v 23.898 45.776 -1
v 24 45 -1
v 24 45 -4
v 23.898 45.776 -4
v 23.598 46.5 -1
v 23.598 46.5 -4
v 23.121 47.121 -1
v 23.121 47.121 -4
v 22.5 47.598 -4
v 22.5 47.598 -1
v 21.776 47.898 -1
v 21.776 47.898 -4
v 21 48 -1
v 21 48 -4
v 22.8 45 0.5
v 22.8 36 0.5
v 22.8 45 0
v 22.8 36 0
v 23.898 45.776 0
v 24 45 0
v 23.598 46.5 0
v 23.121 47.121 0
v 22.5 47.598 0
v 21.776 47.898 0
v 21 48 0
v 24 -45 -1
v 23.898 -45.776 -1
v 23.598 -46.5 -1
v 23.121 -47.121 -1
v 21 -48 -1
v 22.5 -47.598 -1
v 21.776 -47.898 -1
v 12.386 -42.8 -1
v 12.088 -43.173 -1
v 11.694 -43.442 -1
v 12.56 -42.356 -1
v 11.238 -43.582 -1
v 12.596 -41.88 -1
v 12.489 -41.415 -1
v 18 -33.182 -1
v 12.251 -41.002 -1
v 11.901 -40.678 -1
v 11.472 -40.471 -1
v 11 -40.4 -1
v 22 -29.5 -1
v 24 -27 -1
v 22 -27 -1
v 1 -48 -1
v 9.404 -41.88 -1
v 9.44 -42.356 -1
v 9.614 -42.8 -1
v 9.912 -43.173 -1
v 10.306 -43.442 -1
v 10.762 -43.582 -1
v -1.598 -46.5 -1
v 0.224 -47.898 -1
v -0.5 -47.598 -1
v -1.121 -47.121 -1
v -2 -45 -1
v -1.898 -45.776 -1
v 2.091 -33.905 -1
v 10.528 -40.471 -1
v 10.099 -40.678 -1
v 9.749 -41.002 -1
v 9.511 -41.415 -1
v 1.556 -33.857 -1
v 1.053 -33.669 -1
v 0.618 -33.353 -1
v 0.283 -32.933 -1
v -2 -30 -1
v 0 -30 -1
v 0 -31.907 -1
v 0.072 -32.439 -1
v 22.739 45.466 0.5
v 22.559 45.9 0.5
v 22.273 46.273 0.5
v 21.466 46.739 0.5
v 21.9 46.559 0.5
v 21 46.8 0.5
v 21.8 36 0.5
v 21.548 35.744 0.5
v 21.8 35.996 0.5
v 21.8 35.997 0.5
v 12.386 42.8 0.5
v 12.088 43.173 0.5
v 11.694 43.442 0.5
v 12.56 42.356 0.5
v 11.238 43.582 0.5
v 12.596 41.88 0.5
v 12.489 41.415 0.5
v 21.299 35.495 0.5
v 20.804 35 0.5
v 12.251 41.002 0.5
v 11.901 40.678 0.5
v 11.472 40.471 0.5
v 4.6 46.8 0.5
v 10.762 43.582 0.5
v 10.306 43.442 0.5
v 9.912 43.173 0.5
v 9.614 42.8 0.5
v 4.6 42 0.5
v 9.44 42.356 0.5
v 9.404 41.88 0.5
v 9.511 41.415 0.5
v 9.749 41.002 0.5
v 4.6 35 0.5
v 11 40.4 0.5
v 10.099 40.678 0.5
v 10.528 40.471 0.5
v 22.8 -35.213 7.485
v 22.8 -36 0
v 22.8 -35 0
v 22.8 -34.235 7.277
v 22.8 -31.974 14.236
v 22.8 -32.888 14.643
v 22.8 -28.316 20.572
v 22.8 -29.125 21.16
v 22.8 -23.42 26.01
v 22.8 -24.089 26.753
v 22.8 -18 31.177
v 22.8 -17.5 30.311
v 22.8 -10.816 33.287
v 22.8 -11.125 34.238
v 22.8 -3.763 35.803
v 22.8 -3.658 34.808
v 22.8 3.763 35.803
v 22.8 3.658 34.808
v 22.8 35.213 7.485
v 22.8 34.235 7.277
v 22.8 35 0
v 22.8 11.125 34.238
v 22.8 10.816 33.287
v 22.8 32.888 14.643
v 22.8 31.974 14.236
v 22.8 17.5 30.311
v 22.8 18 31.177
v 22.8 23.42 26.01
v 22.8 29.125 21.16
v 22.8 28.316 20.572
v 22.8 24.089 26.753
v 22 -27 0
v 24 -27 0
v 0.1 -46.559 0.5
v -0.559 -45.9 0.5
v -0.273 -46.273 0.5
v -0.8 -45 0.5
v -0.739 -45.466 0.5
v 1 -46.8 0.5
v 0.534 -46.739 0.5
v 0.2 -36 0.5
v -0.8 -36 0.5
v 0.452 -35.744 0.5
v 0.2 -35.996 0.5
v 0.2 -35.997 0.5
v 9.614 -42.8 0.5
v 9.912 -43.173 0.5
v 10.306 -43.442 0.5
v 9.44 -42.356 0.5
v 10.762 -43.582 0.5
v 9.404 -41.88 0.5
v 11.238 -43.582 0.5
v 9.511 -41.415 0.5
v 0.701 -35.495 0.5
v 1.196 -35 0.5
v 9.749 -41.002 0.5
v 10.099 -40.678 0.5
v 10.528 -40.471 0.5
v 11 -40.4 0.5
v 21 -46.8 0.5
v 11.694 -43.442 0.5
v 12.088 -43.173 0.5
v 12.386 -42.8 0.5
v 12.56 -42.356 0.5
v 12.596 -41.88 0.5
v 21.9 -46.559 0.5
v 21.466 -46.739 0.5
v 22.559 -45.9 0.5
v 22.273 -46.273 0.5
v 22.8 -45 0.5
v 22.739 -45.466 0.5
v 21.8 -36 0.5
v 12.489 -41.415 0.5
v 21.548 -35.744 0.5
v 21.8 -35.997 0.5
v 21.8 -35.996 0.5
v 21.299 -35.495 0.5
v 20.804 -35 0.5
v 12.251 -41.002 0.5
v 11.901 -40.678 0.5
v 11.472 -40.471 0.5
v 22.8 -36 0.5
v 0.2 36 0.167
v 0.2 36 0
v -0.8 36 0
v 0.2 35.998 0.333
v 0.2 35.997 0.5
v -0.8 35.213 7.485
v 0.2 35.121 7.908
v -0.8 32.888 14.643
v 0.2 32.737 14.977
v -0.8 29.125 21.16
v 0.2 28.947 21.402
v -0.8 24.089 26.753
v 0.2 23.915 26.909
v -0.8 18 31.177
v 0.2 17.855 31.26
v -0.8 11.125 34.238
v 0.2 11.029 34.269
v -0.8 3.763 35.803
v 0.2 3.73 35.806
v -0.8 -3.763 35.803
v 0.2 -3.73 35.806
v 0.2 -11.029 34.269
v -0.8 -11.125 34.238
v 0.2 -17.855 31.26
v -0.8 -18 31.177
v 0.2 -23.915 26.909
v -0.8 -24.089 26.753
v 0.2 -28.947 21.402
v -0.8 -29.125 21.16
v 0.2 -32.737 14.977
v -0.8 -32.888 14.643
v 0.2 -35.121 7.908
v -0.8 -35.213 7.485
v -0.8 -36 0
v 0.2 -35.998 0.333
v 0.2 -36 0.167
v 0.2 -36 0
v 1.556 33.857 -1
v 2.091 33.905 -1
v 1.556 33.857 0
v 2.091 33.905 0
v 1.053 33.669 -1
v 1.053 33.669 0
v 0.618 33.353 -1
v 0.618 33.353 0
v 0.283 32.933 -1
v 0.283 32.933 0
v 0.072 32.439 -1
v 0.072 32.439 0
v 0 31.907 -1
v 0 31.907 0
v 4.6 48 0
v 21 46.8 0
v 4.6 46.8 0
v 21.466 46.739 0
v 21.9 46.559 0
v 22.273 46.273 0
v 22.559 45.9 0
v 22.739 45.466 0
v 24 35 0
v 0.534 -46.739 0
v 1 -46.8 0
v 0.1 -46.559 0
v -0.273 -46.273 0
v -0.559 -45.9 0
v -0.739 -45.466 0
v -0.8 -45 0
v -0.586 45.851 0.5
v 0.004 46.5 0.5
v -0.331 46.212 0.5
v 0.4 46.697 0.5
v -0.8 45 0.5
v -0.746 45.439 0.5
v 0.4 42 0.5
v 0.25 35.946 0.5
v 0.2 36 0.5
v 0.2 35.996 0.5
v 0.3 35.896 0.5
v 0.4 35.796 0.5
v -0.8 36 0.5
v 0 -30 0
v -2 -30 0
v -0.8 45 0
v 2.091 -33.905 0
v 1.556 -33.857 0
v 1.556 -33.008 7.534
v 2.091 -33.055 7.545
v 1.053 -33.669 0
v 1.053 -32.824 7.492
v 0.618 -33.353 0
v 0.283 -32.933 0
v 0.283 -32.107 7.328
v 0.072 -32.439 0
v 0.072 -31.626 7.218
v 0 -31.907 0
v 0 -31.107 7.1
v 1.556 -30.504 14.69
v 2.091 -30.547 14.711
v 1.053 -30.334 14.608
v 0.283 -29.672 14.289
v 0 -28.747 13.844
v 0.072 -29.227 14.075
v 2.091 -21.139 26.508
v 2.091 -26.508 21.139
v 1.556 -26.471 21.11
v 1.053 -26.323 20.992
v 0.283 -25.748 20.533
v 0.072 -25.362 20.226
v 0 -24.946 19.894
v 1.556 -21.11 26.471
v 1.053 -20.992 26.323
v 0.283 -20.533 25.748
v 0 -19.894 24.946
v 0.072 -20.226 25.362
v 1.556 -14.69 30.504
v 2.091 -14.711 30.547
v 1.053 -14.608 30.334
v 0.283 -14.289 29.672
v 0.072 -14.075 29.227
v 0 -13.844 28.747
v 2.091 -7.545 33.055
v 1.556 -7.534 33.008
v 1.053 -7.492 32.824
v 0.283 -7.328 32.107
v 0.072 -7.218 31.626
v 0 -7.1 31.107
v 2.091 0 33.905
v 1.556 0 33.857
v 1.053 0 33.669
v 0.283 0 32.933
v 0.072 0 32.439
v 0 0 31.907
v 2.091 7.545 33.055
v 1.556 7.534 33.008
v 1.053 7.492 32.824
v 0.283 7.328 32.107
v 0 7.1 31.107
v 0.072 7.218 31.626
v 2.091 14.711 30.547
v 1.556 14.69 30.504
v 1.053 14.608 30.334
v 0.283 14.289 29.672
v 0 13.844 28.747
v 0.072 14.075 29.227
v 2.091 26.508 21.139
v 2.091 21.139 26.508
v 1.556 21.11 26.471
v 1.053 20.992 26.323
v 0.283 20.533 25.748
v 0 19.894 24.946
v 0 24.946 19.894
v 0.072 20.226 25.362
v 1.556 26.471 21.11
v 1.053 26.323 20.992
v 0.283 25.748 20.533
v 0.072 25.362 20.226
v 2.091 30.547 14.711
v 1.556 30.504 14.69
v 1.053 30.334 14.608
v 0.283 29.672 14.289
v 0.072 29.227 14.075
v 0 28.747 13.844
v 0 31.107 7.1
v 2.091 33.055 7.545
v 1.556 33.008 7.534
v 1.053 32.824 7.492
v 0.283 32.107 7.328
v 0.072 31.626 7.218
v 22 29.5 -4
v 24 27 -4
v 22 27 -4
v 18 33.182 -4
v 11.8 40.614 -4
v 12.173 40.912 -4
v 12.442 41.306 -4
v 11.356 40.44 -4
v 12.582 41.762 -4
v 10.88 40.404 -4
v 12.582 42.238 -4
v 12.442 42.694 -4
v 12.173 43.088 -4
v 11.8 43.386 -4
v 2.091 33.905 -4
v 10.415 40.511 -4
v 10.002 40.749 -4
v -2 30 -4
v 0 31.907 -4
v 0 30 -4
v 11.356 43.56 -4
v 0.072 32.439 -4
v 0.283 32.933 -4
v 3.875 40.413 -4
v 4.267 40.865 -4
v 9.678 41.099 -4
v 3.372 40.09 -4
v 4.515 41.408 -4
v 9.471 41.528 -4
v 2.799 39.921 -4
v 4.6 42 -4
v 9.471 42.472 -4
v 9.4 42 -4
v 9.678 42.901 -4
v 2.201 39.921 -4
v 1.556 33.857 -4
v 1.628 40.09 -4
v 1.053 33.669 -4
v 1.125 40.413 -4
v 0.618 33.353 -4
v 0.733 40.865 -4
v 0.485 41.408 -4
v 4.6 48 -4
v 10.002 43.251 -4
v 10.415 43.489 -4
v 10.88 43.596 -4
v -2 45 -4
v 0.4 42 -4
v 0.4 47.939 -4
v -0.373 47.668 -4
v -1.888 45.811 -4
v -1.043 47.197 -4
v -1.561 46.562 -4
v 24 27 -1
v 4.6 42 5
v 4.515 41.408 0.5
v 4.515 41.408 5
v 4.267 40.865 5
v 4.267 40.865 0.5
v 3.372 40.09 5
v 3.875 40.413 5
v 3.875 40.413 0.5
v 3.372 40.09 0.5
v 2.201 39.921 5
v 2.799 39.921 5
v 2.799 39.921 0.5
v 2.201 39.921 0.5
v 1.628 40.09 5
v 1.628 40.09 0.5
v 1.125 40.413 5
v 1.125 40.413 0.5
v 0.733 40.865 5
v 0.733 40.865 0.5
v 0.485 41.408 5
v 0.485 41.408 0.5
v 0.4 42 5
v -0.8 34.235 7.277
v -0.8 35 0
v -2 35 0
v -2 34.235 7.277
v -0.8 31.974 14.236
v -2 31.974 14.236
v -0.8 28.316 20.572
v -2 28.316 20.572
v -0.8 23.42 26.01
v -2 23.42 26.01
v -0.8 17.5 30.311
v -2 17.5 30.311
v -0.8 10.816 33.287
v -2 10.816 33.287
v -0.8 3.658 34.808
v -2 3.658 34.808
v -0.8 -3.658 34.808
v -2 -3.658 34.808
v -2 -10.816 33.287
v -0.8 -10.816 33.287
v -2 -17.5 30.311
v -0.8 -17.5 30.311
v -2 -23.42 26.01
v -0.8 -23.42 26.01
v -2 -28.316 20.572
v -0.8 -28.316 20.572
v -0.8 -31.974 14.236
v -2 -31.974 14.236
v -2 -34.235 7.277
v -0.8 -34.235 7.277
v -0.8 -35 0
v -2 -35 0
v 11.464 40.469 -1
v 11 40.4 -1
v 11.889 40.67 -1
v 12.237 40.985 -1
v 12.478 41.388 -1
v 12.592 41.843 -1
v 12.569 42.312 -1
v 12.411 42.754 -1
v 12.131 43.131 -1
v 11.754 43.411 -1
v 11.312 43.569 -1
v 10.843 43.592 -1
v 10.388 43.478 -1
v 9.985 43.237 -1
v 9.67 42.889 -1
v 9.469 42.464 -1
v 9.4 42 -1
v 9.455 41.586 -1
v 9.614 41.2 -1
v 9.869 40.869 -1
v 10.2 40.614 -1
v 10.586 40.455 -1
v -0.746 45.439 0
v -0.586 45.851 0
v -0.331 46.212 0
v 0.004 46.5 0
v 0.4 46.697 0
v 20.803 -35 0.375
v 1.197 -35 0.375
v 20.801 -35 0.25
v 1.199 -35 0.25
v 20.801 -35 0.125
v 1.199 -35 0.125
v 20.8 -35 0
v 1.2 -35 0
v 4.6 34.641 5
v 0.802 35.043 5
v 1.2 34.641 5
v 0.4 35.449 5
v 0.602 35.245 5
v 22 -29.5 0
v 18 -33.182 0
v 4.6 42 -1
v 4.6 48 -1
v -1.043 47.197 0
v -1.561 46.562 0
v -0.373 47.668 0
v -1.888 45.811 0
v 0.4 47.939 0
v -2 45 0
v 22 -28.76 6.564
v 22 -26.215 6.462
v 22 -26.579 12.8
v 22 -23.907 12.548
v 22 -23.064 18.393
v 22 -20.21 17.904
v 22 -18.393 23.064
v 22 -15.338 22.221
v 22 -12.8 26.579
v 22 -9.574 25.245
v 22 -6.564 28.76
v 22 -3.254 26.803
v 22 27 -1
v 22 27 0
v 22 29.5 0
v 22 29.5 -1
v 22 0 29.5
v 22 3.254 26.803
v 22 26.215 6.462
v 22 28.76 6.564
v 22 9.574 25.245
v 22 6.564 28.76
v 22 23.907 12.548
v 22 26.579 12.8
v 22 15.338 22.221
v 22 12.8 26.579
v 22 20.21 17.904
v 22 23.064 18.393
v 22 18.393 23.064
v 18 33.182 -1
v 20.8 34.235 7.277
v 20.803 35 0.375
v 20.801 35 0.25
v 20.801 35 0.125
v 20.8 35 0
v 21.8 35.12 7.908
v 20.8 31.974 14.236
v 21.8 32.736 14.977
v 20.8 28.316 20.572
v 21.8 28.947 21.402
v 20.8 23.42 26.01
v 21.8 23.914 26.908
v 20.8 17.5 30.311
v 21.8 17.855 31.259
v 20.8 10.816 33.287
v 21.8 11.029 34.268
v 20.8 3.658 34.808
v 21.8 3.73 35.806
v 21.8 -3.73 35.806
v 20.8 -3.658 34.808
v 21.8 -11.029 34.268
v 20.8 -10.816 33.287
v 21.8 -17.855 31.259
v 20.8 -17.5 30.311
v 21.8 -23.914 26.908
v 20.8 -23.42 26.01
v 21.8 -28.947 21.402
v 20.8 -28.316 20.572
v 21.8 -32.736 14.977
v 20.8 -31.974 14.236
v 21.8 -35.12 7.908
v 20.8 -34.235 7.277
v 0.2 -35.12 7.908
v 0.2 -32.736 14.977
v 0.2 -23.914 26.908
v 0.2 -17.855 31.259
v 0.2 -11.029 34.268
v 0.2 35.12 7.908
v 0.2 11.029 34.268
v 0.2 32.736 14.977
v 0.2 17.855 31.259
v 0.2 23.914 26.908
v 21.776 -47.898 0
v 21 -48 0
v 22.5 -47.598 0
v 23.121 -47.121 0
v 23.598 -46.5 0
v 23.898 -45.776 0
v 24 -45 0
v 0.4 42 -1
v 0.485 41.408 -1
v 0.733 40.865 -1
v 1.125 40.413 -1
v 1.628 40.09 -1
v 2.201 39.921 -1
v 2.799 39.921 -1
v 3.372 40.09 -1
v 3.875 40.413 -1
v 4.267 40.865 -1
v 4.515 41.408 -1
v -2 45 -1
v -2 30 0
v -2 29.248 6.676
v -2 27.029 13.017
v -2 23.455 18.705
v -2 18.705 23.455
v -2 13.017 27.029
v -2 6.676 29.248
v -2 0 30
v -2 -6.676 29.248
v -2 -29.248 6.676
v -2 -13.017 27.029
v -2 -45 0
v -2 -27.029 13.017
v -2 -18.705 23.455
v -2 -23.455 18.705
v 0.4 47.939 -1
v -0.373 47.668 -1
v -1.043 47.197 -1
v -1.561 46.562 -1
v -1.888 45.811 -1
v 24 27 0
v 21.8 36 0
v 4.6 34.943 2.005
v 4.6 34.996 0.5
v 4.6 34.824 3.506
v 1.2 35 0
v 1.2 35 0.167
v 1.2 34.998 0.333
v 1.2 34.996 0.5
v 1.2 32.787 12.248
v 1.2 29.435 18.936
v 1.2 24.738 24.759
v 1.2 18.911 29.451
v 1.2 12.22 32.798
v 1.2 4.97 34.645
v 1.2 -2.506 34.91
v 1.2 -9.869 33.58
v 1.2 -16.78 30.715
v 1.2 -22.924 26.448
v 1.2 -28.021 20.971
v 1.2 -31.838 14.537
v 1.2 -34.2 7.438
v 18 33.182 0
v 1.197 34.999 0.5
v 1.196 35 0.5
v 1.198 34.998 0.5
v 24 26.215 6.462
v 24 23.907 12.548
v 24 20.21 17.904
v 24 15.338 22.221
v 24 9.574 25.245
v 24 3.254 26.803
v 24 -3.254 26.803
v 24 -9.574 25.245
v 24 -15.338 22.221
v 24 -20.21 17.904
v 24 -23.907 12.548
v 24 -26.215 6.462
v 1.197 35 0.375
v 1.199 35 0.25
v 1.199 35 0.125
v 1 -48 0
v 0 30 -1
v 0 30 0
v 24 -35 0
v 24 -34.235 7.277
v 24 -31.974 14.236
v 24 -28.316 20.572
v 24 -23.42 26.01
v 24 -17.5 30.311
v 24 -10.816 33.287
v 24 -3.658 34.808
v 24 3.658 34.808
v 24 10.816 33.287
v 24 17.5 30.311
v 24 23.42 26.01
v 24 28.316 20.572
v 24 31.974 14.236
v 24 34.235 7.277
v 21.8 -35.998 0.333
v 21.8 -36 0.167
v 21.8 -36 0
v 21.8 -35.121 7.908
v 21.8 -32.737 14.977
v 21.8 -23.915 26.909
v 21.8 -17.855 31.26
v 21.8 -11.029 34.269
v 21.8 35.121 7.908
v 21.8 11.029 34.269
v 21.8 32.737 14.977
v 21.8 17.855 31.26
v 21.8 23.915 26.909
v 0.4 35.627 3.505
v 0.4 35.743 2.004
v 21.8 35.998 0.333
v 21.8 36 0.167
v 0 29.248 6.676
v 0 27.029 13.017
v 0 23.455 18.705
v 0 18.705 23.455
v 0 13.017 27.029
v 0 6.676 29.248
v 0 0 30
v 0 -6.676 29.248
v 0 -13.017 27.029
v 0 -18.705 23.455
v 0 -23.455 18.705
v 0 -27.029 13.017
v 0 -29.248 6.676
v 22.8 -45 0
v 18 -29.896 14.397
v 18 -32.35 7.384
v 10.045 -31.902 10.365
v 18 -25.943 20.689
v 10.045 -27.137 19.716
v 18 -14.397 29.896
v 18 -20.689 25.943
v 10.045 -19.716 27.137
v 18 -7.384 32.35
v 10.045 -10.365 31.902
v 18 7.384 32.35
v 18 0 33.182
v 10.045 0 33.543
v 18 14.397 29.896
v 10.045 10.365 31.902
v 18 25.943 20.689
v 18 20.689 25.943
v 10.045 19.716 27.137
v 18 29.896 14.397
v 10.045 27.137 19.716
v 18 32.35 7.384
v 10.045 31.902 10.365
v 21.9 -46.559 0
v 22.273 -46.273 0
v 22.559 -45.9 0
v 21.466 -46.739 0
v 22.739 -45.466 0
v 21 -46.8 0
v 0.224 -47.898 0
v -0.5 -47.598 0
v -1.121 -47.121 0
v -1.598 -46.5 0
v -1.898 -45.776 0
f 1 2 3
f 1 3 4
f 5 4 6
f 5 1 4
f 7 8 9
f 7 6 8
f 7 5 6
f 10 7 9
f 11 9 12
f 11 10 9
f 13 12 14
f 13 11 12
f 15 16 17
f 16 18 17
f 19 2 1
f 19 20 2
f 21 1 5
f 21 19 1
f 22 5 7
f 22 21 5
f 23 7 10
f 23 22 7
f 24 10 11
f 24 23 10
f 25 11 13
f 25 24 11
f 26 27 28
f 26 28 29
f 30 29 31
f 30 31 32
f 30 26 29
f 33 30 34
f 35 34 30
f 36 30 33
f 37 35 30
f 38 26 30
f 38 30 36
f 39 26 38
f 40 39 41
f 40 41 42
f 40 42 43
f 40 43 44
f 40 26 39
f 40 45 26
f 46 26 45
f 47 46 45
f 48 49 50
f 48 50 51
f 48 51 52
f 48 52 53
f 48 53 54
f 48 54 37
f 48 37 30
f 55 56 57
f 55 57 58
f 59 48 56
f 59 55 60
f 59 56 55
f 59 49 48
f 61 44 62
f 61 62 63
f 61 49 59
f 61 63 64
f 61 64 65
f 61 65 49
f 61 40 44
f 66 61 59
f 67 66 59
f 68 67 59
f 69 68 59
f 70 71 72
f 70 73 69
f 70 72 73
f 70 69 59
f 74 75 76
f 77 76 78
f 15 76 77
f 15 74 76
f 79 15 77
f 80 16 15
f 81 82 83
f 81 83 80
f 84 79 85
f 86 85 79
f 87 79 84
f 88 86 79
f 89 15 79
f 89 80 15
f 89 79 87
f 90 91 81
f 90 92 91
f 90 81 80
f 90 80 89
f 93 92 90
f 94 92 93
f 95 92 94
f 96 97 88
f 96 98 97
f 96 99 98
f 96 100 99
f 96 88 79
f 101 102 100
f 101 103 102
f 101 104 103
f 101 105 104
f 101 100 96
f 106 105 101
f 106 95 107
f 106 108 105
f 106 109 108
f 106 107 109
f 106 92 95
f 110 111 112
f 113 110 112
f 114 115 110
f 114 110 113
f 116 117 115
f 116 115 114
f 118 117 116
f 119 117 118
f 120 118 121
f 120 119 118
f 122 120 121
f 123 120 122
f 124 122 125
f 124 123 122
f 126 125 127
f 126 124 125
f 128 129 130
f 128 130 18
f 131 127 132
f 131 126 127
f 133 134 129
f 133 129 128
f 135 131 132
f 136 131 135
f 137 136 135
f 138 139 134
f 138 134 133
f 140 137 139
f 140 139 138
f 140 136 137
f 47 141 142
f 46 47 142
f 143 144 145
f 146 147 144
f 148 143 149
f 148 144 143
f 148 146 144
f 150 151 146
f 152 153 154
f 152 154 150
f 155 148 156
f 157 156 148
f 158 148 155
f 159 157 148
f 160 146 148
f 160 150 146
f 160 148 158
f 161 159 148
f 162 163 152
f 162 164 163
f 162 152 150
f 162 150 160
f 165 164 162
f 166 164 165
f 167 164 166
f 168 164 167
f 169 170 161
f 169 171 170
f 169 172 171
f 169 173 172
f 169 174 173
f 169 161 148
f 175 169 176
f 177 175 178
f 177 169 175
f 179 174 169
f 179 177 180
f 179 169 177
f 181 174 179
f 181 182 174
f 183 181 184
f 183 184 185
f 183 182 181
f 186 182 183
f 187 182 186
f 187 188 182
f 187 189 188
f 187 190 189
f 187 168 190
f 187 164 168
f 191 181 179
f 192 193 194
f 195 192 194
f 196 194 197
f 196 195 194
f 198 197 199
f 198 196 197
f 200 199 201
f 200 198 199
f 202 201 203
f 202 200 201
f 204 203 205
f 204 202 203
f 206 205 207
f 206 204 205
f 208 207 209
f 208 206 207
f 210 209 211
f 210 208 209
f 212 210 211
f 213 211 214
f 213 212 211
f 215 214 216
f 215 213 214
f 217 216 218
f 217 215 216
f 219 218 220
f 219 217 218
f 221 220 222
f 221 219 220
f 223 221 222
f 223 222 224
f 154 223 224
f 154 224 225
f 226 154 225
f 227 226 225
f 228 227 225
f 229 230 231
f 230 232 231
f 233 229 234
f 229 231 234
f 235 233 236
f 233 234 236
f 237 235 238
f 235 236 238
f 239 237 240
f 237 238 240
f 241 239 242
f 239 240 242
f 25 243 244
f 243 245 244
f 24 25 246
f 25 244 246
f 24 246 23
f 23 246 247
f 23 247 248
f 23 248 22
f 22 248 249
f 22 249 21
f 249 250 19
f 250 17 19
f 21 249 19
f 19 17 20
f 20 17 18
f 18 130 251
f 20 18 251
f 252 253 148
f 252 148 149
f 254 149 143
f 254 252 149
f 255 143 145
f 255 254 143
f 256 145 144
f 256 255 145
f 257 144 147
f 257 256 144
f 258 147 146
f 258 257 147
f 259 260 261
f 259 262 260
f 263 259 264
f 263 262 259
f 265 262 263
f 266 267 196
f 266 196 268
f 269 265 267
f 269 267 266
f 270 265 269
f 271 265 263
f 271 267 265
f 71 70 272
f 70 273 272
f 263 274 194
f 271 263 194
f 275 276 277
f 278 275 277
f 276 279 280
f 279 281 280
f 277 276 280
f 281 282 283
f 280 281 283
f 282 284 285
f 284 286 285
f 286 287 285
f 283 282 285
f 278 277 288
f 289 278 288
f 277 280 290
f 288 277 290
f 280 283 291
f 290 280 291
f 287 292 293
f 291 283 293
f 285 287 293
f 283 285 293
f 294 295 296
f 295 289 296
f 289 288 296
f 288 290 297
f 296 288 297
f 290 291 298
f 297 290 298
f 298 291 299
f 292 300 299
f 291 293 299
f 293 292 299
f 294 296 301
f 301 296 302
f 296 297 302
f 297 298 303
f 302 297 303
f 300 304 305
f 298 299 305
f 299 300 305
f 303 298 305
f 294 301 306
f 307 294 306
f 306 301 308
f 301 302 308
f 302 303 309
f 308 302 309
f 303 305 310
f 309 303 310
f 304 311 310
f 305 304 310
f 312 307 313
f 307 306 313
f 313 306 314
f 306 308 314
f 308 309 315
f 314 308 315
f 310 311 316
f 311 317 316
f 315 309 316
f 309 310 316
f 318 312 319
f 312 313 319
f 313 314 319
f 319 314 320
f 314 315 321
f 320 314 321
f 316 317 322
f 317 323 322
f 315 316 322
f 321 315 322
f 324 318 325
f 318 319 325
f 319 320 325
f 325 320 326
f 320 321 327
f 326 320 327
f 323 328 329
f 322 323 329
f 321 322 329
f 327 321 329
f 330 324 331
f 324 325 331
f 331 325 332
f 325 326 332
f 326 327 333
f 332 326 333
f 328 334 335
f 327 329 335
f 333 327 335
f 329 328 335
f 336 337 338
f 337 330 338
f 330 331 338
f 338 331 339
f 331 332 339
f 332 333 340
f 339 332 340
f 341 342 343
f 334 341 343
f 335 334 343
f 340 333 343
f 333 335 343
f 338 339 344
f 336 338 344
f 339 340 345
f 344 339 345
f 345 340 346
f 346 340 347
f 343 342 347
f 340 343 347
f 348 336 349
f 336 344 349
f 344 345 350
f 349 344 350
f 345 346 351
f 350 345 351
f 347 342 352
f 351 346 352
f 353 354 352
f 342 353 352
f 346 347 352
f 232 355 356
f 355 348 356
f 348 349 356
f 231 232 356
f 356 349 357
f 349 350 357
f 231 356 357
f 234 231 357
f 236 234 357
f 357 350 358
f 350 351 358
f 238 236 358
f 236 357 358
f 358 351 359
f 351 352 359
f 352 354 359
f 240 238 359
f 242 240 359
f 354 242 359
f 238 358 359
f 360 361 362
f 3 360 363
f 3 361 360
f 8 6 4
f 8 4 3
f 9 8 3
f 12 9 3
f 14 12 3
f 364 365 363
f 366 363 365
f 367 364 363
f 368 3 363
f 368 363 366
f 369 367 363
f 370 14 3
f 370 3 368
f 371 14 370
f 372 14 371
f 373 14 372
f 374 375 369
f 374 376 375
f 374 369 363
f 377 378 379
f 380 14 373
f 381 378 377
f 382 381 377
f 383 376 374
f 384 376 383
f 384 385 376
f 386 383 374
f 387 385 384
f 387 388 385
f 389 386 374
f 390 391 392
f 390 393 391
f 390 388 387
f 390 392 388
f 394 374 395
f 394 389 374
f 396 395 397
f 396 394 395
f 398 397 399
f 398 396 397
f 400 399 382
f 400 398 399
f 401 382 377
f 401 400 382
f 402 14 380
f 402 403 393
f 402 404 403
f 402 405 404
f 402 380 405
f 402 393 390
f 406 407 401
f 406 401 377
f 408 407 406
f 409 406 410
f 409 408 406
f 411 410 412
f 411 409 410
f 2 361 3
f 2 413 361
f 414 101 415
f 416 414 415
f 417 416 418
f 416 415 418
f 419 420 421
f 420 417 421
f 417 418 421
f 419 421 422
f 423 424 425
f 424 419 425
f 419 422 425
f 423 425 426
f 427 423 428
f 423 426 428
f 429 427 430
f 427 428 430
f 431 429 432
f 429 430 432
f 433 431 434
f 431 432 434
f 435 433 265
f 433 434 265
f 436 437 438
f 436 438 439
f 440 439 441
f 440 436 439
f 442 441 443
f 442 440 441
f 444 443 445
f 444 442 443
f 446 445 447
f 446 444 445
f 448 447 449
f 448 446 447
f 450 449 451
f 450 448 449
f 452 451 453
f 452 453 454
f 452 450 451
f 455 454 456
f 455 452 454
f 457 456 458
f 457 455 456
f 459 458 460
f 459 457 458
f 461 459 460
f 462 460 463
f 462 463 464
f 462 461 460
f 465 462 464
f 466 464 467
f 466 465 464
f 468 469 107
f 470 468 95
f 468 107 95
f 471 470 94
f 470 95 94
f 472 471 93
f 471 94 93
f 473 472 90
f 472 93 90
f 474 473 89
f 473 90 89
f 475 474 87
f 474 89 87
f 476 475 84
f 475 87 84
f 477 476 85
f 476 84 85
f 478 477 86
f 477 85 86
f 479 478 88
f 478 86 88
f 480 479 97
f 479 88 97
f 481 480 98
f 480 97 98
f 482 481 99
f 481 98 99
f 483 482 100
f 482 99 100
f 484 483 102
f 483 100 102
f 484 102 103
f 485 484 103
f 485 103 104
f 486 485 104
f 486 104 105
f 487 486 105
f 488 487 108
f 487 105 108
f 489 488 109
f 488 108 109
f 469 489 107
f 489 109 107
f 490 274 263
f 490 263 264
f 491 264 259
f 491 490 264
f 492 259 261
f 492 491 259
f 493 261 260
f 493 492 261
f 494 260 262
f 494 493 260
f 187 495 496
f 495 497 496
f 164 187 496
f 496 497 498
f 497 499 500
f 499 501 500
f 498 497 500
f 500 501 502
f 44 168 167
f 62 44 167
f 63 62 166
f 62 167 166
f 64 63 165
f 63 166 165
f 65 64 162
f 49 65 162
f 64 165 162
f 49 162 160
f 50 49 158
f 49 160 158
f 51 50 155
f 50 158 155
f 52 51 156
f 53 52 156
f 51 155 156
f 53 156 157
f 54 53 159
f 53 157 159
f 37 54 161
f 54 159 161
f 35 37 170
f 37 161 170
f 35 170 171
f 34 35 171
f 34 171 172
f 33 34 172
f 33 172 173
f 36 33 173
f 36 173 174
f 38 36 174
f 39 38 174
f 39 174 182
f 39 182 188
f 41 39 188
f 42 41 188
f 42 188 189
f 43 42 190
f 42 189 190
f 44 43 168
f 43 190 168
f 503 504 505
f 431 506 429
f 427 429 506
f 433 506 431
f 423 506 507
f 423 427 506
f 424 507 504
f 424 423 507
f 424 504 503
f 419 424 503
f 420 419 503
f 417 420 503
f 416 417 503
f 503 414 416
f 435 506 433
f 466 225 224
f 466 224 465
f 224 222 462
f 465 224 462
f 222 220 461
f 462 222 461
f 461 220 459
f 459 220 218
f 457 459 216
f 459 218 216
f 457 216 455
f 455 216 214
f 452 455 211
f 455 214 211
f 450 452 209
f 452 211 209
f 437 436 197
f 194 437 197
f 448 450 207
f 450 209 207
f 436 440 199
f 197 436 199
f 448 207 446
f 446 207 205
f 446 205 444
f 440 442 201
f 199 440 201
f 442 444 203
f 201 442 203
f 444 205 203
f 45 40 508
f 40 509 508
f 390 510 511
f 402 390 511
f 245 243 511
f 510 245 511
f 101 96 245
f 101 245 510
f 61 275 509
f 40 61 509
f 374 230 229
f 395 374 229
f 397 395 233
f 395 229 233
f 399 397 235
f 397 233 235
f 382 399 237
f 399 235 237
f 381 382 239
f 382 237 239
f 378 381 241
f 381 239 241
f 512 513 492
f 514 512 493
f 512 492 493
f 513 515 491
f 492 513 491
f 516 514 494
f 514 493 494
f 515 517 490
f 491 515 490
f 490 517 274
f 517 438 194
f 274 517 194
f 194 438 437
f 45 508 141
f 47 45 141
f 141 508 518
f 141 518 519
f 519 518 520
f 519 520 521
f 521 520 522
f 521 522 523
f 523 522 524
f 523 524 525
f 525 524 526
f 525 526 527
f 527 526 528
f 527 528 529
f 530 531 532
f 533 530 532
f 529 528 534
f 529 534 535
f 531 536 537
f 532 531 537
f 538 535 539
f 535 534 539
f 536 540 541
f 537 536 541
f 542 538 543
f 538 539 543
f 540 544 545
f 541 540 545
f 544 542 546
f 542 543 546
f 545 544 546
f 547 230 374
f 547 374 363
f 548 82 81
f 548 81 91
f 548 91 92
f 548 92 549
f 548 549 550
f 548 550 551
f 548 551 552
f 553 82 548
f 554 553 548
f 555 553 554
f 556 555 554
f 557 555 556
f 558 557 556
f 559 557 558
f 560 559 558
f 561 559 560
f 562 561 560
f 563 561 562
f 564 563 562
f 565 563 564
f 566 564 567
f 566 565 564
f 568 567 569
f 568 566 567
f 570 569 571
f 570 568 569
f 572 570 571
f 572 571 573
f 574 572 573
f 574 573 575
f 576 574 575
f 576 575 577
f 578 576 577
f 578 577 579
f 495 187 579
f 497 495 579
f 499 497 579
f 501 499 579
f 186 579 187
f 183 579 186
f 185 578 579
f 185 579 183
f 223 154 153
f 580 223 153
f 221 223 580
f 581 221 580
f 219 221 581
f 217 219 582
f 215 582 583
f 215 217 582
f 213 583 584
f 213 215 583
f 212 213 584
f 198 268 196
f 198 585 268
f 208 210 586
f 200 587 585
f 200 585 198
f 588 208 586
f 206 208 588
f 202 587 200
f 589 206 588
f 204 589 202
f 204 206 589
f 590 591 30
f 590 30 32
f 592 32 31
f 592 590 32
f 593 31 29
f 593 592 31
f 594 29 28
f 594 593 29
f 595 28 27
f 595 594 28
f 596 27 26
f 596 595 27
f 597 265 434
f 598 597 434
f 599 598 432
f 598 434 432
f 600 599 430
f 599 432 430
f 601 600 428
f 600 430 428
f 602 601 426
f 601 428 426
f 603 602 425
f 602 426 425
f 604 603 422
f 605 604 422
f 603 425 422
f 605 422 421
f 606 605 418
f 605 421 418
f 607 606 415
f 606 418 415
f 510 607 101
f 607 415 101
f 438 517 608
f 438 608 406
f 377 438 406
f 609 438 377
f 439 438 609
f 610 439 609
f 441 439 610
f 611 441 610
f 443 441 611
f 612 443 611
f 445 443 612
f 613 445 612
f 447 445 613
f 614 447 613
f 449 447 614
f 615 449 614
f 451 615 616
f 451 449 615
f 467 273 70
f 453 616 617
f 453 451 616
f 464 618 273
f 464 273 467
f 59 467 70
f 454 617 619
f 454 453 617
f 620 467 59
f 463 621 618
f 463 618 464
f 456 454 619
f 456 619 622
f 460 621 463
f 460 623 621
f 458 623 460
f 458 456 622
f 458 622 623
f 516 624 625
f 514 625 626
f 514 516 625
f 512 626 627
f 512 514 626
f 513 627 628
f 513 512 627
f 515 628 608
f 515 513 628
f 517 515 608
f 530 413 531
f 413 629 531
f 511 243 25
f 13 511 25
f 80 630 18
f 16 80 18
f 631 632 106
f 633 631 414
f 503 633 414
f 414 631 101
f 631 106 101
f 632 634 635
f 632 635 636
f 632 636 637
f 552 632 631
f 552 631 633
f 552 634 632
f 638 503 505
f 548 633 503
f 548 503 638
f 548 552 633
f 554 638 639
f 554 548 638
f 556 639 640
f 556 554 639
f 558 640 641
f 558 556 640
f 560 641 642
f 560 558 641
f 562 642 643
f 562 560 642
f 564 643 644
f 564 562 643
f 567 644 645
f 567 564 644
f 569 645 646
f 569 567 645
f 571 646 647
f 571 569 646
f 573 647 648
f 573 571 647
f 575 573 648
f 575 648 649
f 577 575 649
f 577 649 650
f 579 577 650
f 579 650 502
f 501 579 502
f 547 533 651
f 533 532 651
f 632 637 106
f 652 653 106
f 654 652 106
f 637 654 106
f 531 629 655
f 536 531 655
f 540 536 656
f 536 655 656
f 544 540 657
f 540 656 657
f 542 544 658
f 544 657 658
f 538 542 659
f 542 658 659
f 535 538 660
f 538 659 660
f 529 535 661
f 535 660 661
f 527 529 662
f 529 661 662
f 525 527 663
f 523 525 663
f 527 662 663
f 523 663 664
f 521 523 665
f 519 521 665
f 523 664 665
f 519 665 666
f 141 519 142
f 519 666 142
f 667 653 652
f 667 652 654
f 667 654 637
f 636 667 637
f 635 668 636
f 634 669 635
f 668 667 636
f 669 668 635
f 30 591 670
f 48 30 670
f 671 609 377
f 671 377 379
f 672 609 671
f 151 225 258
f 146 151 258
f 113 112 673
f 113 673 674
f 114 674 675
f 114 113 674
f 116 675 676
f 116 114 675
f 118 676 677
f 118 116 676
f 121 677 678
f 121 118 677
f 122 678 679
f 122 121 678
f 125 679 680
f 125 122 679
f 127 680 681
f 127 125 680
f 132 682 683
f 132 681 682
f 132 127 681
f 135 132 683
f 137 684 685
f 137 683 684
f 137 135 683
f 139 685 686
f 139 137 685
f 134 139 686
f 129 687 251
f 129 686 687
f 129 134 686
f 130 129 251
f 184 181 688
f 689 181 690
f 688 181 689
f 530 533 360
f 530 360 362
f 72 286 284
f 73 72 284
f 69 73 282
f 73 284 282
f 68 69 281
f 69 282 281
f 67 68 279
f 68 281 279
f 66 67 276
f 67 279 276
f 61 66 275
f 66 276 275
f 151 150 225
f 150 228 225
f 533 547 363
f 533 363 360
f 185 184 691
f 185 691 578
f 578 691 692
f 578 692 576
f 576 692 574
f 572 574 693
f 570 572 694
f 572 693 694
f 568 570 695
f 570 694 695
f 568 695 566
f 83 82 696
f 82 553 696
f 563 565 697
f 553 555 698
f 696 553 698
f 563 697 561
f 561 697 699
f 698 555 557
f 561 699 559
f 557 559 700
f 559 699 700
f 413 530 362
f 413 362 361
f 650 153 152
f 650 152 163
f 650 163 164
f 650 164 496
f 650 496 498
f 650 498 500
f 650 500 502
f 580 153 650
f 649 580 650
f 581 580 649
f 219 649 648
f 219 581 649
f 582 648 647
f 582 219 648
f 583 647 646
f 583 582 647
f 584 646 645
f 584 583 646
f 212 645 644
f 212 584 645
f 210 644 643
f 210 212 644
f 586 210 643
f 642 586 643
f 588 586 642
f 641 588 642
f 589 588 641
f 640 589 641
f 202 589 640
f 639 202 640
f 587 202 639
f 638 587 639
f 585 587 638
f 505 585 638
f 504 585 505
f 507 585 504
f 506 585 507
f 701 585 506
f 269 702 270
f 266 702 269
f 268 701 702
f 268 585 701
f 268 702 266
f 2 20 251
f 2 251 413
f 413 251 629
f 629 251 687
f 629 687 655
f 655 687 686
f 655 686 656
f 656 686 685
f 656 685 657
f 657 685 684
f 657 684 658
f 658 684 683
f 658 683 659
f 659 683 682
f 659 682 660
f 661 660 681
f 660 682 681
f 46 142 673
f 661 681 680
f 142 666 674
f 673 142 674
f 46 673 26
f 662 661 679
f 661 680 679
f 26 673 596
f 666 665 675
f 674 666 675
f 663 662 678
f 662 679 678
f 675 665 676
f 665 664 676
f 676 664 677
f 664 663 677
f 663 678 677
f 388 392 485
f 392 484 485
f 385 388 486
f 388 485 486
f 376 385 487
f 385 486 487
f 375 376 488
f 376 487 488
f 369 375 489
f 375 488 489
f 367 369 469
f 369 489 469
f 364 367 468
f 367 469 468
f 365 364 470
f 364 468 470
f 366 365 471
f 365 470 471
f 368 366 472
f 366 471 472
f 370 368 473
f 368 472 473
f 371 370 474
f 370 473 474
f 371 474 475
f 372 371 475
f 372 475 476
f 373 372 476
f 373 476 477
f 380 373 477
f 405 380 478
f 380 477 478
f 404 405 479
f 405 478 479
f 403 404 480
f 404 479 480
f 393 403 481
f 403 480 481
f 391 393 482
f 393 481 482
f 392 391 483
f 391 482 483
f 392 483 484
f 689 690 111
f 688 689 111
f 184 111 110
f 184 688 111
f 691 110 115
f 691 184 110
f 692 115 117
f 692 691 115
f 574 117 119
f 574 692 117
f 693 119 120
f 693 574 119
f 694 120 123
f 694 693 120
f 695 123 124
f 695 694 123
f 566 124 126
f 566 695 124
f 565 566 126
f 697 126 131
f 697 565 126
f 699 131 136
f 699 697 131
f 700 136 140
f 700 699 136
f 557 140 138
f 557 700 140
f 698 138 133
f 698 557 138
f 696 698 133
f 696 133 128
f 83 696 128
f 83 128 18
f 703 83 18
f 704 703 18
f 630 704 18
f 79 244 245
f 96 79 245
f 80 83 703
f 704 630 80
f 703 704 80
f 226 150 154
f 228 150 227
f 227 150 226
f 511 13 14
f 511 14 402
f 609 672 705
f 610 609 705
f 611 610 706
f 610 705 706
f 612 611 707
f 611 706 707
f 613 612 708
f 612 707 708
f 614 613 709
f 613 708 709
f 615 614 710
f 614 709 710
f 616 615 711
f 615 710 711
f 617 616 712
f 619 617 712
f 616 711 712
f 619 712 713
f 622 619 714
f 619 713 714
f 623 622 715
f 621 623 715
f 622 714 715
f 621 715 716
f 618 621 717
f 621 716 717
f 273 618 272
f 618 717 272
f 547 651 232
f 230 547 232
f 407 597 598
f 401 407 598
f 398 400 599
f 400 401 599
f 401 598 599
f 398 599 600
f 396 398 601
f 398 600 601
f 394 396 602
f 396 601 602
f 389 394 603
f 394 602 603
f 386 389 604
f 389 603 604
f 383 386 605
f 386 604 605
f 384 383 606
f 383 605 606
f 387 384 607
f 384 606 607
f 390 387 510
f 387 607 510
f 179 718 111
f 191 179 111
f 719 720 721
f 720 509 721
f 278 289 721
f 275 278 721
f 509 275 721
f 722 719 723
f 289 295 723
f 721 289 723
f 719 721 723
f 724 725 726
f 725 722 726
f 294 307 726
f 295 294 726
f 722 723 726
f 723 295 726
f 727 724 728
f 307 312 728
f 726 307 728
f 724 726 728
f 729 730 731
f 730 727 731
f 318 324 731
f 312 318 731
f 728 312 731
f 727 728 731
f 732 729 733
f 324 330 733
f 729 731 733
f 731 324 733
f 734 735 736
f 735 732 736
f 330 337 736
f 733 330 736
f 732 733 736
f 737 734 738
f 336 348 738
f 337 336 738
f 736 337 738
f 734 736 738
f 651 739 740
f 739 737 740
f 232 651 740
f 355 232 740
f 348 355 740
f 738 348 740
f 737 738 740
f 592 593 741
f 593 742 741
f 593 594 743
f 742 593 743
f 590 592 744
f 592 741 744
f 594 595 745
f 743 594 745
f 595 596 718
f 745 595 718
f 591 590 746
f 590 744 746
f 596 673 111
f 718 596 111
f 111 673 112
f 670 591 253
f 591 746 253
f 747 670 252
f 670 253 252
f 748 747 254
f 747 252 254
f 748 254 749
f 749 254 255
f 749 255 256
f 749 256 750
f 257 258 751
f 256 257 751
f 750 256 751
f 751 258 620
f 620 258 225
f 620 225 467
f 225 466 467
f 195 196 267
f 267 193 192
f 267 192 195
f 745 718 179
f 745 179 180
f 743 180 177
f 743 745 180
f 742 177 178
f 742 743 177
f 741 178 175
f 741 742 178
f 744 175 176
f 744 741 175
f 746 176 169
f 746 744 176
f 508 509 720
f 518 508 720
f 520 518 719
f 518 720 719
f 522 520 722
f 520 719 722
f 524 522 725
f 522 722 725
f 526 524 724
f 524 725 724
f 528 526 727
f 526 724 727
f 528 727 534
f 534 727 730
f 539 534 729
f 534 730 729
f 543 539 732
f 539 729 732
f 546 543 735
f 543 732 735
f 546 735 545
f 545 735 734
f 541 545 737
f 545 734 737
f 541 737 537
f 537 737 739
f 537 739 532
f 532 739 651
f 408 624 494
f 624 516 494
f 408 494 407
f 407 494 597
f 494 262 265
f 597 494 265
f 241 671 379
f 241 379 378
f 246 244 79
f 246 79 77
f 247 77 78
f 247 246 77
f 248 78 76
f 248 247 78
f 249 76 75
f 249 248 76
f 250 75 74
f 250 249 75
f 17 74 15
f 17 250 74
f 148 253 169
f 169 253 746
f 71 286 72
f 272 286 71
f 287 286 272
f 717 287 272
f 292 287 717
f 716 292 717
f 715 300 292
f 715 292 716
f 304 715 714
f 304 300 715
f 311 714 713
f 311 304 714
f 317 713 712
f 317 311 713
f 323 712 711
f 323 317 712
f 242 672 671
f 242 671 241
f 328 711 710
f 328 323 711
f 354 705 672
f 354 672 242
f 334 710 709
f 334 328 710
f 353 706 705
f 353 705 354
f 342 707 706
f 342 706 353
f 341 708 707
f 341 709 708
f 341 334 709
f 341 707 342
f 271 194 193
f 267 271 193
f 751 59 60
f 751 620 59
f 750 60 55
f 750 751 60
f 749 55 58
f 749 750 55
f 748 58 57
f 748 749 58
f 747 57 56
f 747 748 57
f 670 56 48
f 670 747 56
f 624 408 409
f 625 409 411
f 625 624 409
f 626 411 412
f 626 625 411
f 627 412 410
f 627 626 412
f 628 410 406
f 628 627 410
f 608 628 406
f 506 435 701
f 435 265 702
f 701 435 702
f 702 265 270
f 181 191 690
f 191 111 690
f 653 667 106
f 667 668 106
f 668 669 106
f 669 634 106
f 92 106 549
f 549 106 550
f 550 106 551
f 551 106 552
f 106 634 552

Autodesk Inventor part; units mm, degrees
ref_plane "YZ Plane" through (0, 0, 0) normal (1, 0, 0) x (0, 1, 0)
ref_plane "XZ Plane" through (0, 0, 0) normal (0, 1, 0) x (-1, 0, 0)
sketch "Sketch1" plane through (0, 0, 0) normal (0, 0, 1) x (1, 0, 0)
  line L0 (0, 30) -> (0, 31.907)
  line L1 (2.0908, 33.905) -> (18, 33.1818)
  line L2 (22, 29.5) -> (22, 27)
  line L3 (22, 27) -> (24, 27)
  line L4 (24, 27) -> (24, 35)
  line L5 (-2, 35) -> (-2, 30)
  line L6 (-2, 30) -> (0, 30)
  line L7 (0, 0) -> (88.4682, 0)
  arc A0 (2.0908, 33.905) -> (0, 31.907) centre (2, 31.907) ccw
  line L8 (18, 33.1818) -> (22, 29.5)
  line L9 (-2, 35) -> (-0.8, 35)
  line L10 (-0.8, 35) -> (-0.8, 36)
  line L11 (-0.8, 36) -> (0.2, 36)
  line L12 (0.2, 36) -> (0.2, 35)
  line L13 (0.2, 35) -> (21.8, 35)
  line L14 (21.8, 35) -> (21.8, 36)
  line L15 (24, 35) -> (22.8, 35)
  line L16 (22.8, 35) -> (22.8, 36)
  line L17 (22.8, 36) -> (21.8, 36)
  point P0 (0, 34)
  point P1 (22, 33)
  point P2 (-1, 30)
  point P3 (22.3, 36)
  point P4 (-0.3, 36)
  dimension "d0" = 66
  dimension "d1" = 68
  dimension "d2" = 22
  dimension "d3" = 2
  dimension "d4" = 6
  dimension "d7" = 2
  dimension "d8" = 4
  dimension "d9" = 3.5
  dimension "d10" = 4
  dimension "d11" = 2
  dimension "d12" = 1.2
  dimension "d13" = 70
  dimension "d14" = 1
  dimension "d16" = 26
  dimension "d66" = 1
revolve "Revolution1" add sketch "Sketch1" angle 180 about axis through (0, 0, 0) along (1, 0, 0)
sketch "Sketch2" plane through (21.8, -35, 0) normal (0, 0, -1) x (-1, 0, 0)
  line L0 (23.8, 0) -> (23.8, 5) projected
  line L1 (23.8, 0) -> (-2.2, 0)
  line L2 (-2.2, 0) -> (-2.2, -10)
  line L3 (0.8, -13) -> (20.8, -13)
  line L4 (23.8, -10) -> (23.8, 0)
  arc A0 (20.8, -13) -> (23.8, -10) centre (20.8, -10) ccw
  arc A1 (-2.2, -10) -> (0.8, -13) centre (0.8, -10) ccw
  line L5 (23.8, 5) -> (21.8, 5) projected
  line L6 (21.8, 5) -> (21.8, 3.093) projected
  arc A2 (19.7092, 1.095) -> (21.8, 3.093) centre (19.8, 3.093) ccw projected
  line L7 (19.7092, 1.095) -> (3.8, 1.8182) projected
  line L8 (3.8, 1.8182) -> (-0.2, 5.5) projected
  line L9 (-0.2, 5.5) -> (-0.2, 8) projected
  line L10 (-0.2, 8) -> (-2.2, 8) projected
  line L11 (-2.2, 8) -> (-2.2, 0) projected
  line L12 (-2.2, 0) -> (-1, 0) projected
  line L13 (-1, 0) -> (-1, -1) projected
  line L14 (-1, -1) -> (0, -1) projected
  line L15 (0, -1) -> (0, 0) projected
  line L16 (0, 0) -> (21.6, 0) projected
  line L17 (21.6, 0) -> (21.6, -1) projected
  line L18 (21.6, -1) -> (22.6, -1) projected
  line L19 (22.6, -1) -> (22.6, 0) projected
  line L20 (22.6, 0) -> (23.8, 0) projected
  line L21 (23.8, 0) -> (23.8, 5) projected
  point P0 (21.8, 35)
  dimension "d17" = 48
  dimension "d18" = 3
extrude "Extrusion1" add sketch "Sketch2" along normal blind 1
sketch "Sketch3" plane through (21.8, -35, 0) normal (0, 0, 1) x (1, 0, 0)
  line L0 (-23.8, -10) -> (-23.8, 0) projected
  arc A0 (-23.8, -10) -> (-20.8, -13) centre (-20.8, -10) ccw projected
  line L1 (-0.8, -13) -> (-20.8, -13) projected
  arc A1 (-0.8, -13) -> (2.2, -10) centre (-0.8, -10) ccw projected
  line L2 (2.2, 0) -> (2.2, -10) projected
  line L3 (0, 0) -> (-21.6, 0) projected
  line L4 (0, -1) -> (0, 71) projected
  line L5 (-21.6, -1) -> (-21.6, 71) projected
  line L6 (-22.6, 0) -> (-22.6, -10)
  arc A2 (-22.6, -10) -> (-20.8, -11.8) centre (-20.8, -10) ccw
  line L7 (-20.8, -11.8) -> (-0.8, -11.8)
  arc A3 (-0.8, -11.8) -> (1, -10) centre (-0.8, -10) ccw
  line L8 (1, -10) -> (1, 0)
  line L9 (-21.6, -1) -> (-22.6, -1) projected
  line L10 (1, -1) -> (0, -1) projected
  point P0 (-21.8, 35)
  point P1 (-21.6, 71)
extrude "Extrusion2" add sketch "Sketch3" along normal blind 0.5
sketch "Sketch4" plane through (21.8, -35, -1) normal (0, 0, -1) x (-1, 0, 0)
  line L0 (0.8, -13) -> (20.8, -13) projected
  point P0 (21.8, 35)
  point P1 (10.8, -7)
  point P2 (10.8, -13)
  dimension "d30" = 42
hole "Hole1" at (11, -42, -1) direction (0, 0, 1) diameter 3.2 depth 4.5 tip angle 118
mirror "Mirror1" about plane through (0, 0, 0) normal (0, 1, 0) of "Extrusion1", "Extrusion2", "Hole1"
sketch "Sketch5" plane through (21, 48, -1) normal (0, 0, -1) x (-1, 0, 0)
  line L0 (23, -3) -> (23, -18) projected
  line L1 (0, 0) -> (20, 0) projected
  point P0 (21, -48)
  point P1 (18.5, -6)
  dimension "d38" = 4.5
  dimension "d39" = 6
hole "Hole2" at (2.5, 42, -1) direction (0, 0, 1) diameter 4.2 depth 8 tip angle 118
chamfer "Chamfer1" distance 1 angle 45 2 edges at (21.8, 0, 35) (0.2, 0, 35)
sketch "Sketch6" plane through (0.2, 35, 0.5) normal (0, 0, 1) x (1, 0, 0)
  circle A0 centre (2.3, 7) radius 2.1 projected
  line L0 (4.4, 7) -> (0.2, 7)
  line L1 (0.2, 7) -> (0.2, -1.0182)
  line L2 (0.2, -1.0182) -> (4.4, -1.2091)
  line L3 (4.4, -1.2091) -> (4.4, 7)
  line L4 (21.6, 0) -> (0, 0) projected
  line L5 (1.8908, -1.095) -> (17.8, -1.8182) projected
  point P0 (-0.2, -35)
  point P1 (0.2, 7)
  point P2 (4.1466, 0)
  point P3 (0.4534, 0)
extrude "Extrusion3" add sketch "Sketch6" along normal blind 4.5 contours L3 L4 L1 A0 | L3 L2 L1 L4
sketch "Sketch7" plane through (1, 46.8, 0.5) normal (0, 0, 1) x (1, 0, 0)
  line L0 (3.6, -12.159) -> (3.6, -4.8) projected
  line L1 (3.6, -4.8) -> (-0.6, -4.8)
  line L2 (-0.6, -4.8) -> (-0.6, 4.5267)
  line L3 (-0.6, 4.5267) -> (3.6, 4.5267)
  line L4 (3.6, 4.5267) -> (3.6, -4.8)
  point P0 (-1, -46.8)
extrude "Extrusion4" cut sketch "Sketch7" against normal blind 4.5
ref_plane "Work Plane1" through (-0.8, 0, 36) normal (0, 0, 1) x (1, 0, 0)
sketch "Sketch8" plane through (-0.8, 0, 36) normal (0, 0, 1) x (1, 0, 0)
  line L0 (0.8, -30) -> (0.8, 30) projected
  line L1 (22.6, -35.9965) -> (22.6, 35.9965) projected
  line L2 (0.8, 2) -> (22.6, 2)
  line L3 (22.6, 2) -> (22.6, -2)
  line L4 (22.6, -2) -> (0.8, -2)
  line L5 (0.8, -2) -> (0.8, 2)
  circle A0 centre (11.7, 0) radius 3
  line L6 (1, -35.9965) -> (1, 35.9965) projected
  point P0 (0.8, 0)
  point P1 (0.8, 0)
  point P2 (11.7, -2)
  point P3 (1, 0)
  point P4 (1, 35.9965)
  point P5 (1, -35.9965)
  point P6 (13.9361, -2)
  point P7 (13.9361, 2)
  point P8 (9.4639, 2)
  point P9 (0.8, -2)
  point P10 (9.4639, -2)
  dimension "d47" = 4
  dimension "d48" = 6
extrude "Extrusion5" [suppressed]
sketch "Sketch9" plane through (-0.8, 0, 36) normal (0, 0, 1) x (1, 0, 0)
  line L0 (22.6, -2) -> (22.6, 0) projected
  line L1 (22.6, 0) -> (22.6, 2) projected
  line L2 (22.6, 2) -> (13.9361, 2) projected
  arc A0 (13.9361, 2) -> (9.4639, 2) centre (11.7, 0) ccw projected
  line L3 (9.4639, 2) -> (0.8, 2) projected
  line L4 (0.8, 2) -> (0.8, 0) projected
  line L5 (0.8, 0) -> (0.8, -2) projected
  line L6 (0.8, -2) -> (9.4639, -2) projected
  arc A1 (9.4639, -2) -> (13.9361, -2) centre (11.7, 0) ccw projected
  line L7 (13.9361, -2) -> (22.6, -2) projected
  line L8 (0.8, 1) -> (22.6, 1)
  line L9 (22.6, 1) -> (22.6, -1)
  line L10 (22.6, -1) -> (0.8, -1)
  line L11 (0.8, -1) -> (0.8, 1)
  circle A2 centre (11.7, 0) radius 3
  point P0 (0.8, 0)
  point P1 (14.5284, 1)
  point P2 (14.5284, -1)
  point P3 (8.8716, 1)
  point P4 (9.4639, 2)
  point P5 (9.4639, -2)
  point P6 (8.8716, -1)
  point P7 (0.8, -1)
extrude "Extrusion6" [suppressed]
chamfer "Chamfer2" [suppressed]
sketch "Sketch10" plane through (-0.8, 0, 36) normal (0, 0, 1) x (1, 0, 0)
  arc A0 (13.9361, 2) -> (9.4639, 2) centre (11.7, 0) ccw projected
  point P0 (0.8, 0)
hole "Hole3" [suppressed]
chamfer "Chamfer3" [suppressed]
sketch "Sketch11" plane through (24, 27, -1) normal (0, 0, -1) x (-1, 0, 0)
  line L0 (23.6, 20.9394) -> (23.6, 15) projected
  arc A0 (19.4, 15) -> (23.6, 15) centre (21.5, 15) ccw projected
  line L1 (19.4, 15) -> (19.4, 21) projected
  line L2 (3, 21) -> (19.4, 21) projected
  arc A1 (3, 21) -> (0, 18) centre (3, 18) ccw projected
  line L3 (0, 0) -> (0, 18) projected
  line L4 (2, 0) -> (0, 0) projected
  line L5 (2, 2.5) -> (2, 0) projected
  line L6 (6, 6.1818) -> (2, 2.5) projected
  line L7 (21.9092, 6.905) -> (6, 6.1818) projected
  arc A2 (24, 4.907) -> (21.9092, 6.905) centre (22, 4.907) ccw projected
  line L8 (24, 3) -> (24, 4.907) projected
  line L9 (26, 3) -> (24, 3) projected
  line L10 (26, 18) -> (26, 3) projected
  arc A3 (26, 18) -> (23.6, 20.9394) centre (23, 18) ccw projected
  circle A4 centre (13, 15) radius 1.6 projected
  point P0 (24, -27)
extrude "Extrusion7" add sketch "Sketch11" along normal blind 3
equation "\"d17\" = 0.5 * Outer_Diameter"
equation "\"Outer_Diameter\" = 96"
properties part number "Test"
